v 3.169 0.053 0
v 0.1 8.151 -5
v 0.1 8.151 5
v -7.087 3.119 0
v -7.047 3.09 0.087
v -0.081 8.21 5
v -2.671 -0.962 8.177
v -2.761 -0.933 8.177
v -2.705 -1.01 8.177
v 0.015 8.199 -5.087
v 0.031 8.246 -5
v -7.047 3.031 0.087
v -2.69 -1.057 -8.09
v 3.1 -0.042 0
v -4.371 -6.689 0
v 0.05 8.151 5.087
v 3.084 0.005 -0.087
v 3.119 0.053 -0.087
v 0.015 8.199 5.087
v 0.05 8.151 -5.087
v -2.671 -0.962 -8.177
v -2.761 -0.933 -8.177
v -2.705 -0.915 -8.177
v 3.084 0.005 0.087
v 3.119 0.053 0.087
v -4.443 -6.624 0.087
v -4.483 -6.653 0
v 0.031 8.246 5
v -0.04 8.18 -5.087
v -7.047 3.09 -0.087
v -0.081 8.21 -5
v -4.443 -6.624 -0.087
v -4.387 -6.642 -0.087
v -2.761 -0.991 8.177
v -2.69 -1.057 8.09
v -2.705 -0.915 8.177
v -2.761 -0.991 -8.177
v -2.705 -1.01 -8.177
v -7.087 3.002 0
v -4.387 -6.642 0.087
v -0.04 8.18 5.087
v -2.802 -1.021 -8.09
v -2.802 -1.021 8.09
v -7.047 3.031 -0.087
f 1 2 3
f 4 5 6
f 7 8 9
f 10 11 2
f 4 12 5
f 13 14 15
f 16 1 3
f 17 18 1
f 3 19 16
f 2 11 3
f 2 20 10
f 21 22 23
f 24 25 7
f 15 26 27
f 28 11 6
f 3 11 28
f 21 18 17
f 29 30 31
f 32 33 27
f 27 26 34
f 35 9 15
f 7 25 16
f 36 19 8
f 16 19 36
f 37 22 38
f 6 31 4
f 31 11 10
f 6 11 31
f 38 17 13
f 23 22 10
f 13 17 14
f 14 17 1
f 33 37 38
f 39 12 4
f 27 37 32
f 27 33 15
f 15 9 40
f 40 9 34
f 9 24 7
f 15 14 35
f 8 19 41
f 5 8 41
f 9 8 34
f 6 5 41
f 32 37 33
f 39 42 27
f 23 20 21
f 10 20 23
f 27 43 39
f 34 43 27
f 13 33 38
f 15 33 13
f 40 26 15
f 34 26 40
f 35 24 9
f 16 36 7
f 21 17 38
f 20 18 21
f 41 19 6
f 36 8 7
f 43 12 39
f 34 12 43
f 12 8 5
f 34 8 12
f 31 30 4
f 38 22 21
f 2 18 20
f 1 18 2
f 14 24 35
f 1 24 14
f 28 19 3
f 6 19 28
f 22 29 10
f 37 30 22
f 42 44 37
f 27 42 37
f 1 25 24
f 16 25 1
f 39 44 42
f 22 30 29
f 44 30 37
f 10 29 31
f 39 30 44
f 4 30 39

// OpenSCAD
// Auto-generated OpenSCAD file

    inner_points = 10*[[-0.7006292682253485, 0.30606485476032513, -6.130120740868102e-13], [0.30689198471783646, 0.005276334587299036, 6.130120740868102e-13], [-0.2720657717976499, -0.09620971856082147, 0.8090169943752502], [-0.27206577179637514, -0.09620971856314678, -0.8090169943746447], [5.5554147393444e-10, 0.8151018158228152, 0.49999999999920747], [5.563293437038652e-10, 0.8151018158213781, -0.5000000000007926], [-0.4402116662866258, -0.6594312211511645, 9.79654968021913e-13]];

    outer_points = 10*[[-3.627212082769728e-05, 5.120611380175485e-06, -0.5257311108429229], [3.627212082769728e-05, -5.120611380175485e-06, 0.5257311108429229], [0.8090169926260806, 0.26286555604709816, -5.325674888357133e-05], [-0.8090169922727908, 0.26286555604709816, 5.837736025155943e-05], [0.4999999983475059, -0.6881909602029435, -4.1199804176948946e-05], [-0.4999999992724306, -0.6881909602029435, 2.779386957237699e-05], [5.716348896531026e-10, 0.8506508083116905, 8.285323236583849e-06]];

    // Convex hull for inner set (I)
    module inner_hull() {
        hull() {
            for (p = inner_points) {
                translate(p) sphere(r=0.1);
            }
        }
    }

    // Convex hull for outer set (O) minus inner hull (O \ I)
    module outer_minus_inner() {
        difference() {
            hull() {
                for (p = outer_points) {
                    translate(p) sphere(r=0.1);
                }
            }
            inner_hull(); // Subtract inner hull
        }
    }

    // Convex hull for outer set (O) minus all translated inner hulls
    module outer_minus_AllTranslationInner() {
        difference() {
            hull() {
                for (p = outer_points) {
                    translate(p) sphere(r=0.1);
                }
            }
            hull() {
                translate([0,0,50]) inner_hull();
                translate([0,0,-50]) inner_hull();
            }; // Subtract translated inner hulls
        }
    }

    // Difference between outer_minus_inner and outer_minus_AllTranslationInner
    module outer_minus_inner_diff() {
        difference() {
            // Outer minus inner
            difference() {
                hull() {
                    for (p = outer_points) {
                        translate(p) sphere(r=0.1);
                    }
                }
                inner_hull();
            }

            // Subtract Outer minus AllTranslationInner
            difference() {
                hull() {
                    for (p = outer_points) {
                        translate(p) sphere(r=0.1);
                    }
                }
                hull() {
                    translate([0,0,50]) inner_hull();
                    translate([0,0,-50]) inner_hull();
                };
            }
        }
    }

    // Rendering all with colors applied
    color([1, 0, 0, 0.5]) inner_hull(); // Transparent red
    
